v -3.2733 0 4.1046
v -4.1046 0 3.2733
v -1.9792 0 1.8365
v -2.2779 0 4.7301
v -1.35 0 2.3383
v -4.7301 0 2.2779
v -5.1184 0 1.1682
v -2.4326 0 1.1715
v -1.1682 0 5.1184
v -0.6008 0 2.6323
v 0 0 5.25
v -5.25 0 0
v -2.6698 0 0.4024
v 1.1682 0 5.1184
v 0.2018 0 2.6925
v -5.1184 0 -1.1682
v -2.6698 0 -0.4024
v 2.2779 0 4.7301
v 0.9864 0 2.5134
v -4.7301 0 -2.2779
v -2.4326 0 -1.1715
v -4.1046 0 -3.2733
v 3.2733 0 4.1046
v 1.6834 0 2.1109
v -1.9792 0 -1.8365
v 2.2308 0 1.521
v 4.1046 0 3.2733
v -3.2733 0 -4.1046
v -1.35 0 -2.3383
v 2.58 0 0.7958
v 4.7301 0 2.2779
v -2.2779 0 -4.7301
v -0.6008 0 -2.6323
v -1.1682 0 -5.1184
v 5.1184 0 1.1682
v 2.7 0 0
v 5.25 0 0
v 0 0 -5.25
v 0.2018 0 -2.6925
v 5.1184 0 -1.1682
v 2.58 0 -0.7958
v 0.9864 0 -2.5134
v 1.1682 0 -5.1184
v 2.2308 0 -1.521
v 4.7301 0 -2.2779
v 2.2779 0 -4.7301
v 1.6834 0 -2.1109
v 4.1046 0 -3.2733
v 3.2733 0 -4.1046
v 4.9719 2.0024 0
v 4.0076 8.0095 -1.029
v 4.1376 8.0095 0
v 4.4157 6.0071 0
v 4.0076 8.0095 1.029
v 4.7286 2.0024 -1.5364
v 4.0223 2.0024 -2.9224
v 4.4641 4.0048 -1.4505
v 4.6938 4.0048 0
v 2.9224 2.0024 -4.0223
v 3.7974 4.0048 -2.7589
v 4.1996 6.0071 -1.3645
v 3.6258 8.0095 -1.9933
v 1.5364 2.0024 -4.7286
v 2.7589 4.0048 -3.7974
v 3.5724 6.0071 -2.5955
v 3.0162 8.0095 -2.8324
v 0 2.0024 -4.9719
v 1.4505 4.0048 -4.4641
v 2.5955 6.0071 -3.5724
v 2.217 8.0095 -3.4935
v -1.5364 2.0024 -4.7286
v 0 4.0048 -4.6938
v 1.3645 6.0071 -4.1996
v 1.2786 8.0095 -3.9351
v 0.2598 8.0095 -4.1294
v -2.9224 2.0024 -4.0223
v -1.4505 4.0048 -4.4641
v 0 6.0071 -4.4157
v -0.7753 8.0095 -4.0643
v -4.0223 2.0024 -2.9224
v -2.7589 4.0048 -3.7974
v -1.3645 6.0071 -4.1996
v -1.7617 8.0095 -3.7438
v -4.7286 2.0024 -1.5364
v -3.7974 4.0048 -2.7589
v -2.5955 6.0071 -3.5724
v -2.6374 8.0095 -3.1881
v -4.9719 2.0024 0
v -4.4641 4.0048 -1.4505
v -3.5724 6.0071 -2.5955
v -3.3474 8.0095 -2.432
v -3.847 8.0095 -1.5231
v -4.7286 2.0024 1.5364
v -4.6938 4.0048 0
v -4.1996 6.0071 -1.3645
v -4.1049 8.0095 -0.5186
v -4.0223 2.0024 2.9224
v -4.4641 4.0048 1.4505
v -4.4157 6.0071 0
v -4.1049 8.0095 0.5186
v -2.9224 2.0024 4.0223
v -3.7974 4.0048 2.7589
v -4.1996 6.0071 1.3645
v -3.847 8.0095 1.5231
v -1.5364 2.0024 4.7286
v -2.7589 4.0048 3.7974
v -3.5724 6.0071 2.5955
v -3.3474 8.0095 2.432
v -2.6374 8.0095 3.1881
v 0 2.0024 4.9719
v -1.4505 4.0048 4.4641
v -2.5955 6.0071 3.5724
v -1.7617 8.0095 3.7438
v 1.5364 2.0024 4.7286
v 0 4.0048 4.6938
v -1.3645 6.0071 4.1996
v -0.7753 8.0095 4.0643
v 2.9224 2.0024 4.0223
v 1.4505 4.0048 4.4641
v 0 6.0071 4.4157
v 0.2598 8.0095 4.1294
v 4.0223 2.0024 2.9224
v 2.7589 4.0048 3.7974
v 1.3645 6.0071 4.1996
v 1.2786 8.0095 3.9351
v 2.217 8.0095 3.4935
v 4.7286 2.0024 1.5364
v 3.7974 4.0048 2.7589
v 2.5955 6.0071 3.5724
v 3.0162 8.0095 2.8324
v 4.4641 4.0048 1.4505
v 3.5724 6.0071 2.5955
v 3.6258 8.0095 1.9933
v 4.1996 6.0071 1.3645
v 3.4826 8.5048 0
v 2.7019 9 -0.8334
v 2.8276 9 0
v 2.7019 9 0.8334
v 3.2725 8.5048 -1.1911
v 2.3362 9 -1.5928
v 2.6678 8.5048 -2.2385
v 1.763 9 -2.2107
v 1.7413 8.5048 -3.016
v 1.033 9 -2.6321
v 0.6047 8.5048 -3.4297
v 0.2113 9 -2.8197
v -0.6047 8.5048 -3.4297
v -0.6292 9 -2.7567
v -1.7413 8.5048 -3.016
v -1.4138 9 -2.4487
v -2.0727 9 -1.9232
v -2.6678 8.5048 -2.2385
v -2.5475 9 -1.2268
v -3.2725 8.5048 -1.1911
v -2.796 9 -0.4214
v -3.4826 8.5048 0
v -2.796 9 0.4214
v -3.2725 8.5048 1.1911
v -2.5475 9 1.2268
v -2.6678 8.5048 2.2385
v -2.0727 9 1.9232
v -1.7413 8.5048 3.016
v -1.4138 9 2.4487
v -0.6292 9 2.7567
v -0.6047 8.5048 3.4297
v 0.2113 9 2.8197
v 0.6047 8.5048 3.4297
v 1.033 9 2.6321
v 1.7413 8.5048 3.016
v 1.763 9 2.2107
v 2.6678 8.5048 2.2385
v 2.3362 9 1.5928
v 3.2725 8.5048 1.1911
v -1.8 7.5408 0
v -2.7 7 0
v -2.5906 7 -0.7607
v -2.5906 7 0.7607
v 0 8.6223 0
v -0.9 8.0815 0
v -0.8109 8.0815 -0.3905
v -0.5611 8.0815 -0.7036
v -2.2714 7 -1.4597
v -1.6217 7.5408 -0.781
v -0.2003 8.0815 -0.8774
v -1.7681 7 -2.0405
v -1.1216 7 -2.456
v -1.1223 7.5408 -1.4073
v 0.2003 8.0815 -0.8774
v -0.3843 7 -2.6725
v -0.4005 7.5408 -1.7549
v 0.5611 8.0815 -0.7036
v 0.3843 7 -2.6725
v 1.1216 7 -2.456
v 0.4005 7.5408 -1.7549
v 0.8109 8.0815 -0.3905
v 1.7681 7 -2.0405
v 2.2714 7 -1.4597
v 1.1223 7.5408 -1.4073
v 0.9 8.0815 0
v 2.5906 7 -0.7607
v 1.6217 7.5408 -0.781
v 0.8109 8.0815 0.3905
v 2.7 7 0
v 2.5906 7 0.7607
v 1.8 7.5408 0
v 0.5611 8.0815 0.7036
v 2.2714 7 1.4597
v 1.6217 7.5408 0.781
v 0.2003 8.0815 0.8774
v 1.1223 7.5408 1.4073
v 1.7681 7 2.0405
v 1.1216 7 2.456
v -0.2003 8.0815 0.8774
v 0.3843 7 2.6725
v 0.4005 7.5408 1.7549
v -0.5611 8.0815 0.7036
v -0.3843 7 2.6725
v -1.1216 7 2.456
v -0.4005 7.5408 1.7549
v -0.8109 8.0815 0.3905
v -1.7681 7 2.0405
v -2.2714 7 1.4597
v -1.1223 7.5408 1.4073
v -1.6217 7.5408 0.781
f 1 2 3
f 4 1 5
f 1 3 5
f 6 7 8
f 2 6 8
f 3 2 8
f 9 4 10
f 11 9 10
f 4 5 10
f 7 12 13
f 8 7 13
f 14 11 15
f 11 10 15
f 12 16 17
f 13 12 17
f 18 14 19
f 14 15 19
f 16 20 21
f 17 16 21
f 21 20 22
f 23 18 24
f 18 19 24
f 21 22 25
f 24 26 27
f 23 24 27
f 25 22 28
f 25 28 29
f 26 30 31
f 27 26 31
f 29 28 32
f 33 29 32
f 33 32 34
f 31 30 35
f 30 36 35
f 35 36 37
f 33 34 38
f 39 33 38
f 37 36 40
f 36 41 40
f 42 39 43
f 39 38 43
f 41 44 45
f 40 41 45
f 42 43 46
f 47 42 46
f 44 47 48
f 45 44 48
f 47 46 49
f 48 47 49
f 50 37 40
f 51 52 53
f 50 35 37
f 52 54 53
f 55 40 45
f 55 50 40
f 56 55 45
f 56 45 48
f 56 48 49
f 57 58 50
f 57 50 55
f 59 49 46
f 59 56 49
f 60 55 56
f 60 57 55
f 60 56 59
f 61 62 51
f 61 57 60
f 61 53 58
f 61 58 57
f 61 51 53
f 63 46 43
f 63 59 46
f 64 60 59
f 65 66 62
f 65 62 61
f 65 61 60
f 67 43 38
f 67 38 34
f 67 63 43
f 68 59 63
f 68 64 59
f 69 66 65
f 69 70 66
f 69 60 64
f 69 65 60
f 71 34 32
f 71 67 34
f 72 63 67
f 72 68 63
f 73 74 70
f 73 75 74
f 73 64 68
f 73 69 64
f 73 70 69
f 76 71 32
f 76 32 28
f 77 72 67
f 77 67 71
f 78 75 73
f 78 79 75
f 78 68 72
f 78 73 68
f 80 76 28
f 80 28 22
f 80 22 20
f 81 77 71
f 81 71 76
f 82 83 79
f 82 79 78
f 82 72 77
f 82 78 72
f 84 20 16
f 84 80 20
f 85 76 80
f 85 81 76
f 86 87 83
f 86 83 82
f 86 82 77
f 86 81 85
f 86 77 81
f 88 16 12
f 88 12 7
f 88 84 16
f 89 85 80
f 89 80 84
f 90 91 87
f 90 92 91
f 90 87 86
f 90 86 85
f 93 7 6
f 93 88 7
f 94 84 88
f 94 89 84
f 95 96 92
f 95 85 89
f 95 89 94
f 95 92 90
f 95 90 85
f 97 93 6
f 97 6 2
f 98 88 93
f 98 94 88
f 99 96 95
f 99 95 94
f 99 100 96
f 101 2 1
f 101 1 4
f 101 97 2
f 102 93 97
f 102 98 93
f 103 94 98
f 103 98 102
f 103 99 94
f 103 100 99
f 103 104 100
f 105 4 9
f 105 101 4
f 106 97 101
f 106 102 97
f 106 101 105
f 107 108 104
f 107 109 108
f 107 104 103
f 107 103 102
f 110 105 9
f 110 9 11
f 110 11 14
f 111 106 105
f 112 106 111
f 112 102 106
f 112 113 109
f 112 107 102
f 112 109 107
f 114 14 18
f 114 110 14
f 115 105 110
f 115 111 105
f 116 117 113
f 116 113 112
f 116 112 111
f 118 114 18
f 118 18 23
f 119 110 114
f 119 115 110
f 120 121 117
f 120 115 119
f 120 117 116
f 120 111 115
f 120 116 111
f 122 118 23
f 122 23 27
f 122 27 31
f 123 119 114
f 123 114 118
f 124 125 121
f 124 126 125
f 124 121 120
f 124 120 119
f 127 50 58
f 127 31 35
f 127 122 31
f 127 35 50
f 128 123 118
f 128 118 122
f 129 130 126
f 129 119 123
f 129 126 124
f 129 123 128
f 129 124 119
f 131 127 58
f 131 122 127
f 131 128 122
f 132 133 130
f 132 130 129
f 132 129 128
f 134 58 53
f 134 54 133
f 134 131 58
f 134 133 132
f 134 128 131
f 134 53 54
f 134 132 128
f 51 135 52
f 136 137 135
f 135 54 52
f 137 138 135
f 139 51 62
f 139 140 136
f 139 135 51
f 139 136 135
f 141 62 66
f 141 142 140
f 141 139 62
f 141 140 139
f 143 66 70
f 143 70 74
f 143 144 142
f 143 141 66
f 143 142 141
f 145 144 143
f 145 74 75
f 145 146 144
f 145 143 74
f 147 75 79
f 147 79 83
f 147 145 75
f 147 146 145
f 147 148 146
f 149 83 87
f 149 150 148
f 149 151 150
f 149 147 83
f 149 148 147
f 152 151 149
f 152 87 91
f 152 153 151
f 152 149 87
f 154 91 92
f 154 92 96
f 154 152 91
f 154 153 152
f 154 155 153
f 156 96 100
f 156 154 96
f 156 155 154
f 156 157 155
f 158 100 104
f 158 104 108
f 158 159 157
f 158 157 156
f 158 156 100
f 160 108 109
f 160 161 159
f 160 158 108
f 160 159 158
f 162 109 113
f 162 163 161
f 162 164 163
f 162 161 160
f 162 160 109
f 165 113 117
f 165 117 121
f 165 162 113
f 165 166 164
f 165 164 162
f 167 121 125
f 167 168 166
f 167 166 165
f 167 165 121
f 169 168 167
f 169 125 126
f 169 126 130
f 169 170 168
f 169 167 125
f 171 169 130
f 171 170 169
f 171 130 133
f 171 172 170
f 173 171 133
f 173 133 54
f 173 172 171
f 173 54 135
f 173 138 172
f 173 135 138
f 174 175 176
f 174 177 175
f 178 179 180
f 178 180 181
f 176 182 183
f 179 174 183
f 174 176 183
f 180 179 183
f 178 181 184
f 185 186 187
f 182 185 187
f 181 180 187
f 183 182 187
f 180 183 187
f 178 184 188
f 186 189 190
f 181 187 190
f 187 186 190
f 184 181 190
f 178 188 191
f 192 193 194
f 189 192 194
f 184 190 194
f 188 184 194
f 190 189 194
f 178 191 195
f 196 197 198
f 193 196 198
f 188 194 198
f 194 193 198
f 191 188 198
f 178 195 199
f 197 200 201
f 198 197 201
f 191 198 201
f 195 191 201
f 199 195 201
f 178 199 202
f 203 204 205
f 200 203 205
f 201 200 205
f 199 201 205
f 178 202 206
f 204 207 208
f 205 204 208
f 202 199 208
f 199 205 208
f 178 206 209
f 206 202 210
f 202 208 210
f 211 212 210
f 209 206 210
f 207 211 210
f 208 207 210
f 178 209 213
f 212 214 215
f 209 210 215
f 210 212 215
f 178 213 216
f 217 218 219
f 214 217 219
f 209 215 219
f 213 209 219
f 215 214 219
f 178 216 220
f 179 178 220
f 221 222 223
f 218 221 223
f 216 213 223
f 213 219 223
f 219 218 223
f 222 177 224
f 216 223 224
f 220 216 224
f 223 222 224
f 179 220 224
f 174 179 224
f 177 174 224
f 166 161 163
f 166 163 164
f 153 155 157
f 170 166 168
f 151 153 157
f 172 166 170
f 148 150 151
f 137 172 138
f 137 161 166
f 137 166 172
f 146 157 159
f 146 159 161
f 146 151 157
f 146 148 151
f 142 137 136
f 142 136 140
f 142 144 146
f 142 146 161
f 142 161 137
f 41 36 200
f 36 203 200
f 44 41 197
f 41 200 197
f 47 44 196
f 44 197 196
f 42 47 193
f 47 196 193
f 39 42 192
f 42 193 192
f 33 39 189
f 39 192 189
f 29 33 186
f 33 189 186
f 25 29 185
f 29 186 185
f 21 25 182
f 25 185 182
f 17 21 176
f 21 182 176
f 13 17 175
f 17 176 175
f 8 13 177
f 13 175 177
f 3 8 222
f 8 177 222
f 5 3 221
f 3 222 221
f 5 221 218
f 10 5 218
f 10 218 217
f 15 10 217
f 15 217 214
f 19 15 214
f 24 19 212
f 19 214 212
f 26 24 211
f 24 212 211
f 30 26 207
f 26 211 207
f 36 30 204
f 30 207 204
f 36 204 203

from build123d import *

# Parameters (mm, degrees)
SCHIZZO1_R               = 5.25
SCHIZZO2_R               = 4
SMUSSO1_SIZE             = 1
SMUSSO1_SIZE2            = 1.172437538
FORO_PER_VITE_M3_1_D     = 5.4
FORO_PER_VITE_M3_1_DEPTH = 7
FORO_PER_VITE_M3_1_TIP   = 1.622323671


with BuildPart() as part:
    # Schizzo1 → Loft1 section 0
    with BuildSketch(Plane(origin=(0, 0, 0), x_dir=(1, 0, 0), z_dir=(0, 1, 0))):
        Circle(SCHIZZO1_R)
    # Schizzo2 → Loft1 section 1
    with BuildSketch(Plane(origin=(0, 9, 0), x_dir=(1, 0, 0), z_dir=(0, 1, 0))):
        Circle(SCHIZZO2_R)
    loft()

    # Smusso1
    smusso1_edges = [part.edges().sort_by_distance(p)[0] for p in [
        (-4, 9, 0),
    ]]
    smusso1_side = [part.faces().sort_by_distance(p)[0] for p in [
        (-4.625, 4.5, 0),
    ]]
    chamfer(smusso1_edges, length=SMUSSO1_SIZE, length2=SMUSSO1_SIZE2, reference=smusso1_side[0])

    # Foro per Vite M3-1
    with Locations(Plane(origin=(0, 0, 0), x_dir=(-1, 0, 0), z_dir=(0, -1, 0))):
        with Locations((0, 0)):
            Hole(FORO_PER_VITE_M3_1_D / 2, depth=FORO_PER_VITE_M3_1_DEPTH)
            with Locations((0, 0, -(FORO_PER_VITE_M3_1_DEPTH + FORO_PER_VITE_M3_1_TIP / 2))):  # 118° drill point
                Cone(0, FORO_PER_VITE_M3_1_D / 2, FORO_PER_VITE_M3_1_TIP, mode=Mode.SUBTRACT)


solid = part.part
